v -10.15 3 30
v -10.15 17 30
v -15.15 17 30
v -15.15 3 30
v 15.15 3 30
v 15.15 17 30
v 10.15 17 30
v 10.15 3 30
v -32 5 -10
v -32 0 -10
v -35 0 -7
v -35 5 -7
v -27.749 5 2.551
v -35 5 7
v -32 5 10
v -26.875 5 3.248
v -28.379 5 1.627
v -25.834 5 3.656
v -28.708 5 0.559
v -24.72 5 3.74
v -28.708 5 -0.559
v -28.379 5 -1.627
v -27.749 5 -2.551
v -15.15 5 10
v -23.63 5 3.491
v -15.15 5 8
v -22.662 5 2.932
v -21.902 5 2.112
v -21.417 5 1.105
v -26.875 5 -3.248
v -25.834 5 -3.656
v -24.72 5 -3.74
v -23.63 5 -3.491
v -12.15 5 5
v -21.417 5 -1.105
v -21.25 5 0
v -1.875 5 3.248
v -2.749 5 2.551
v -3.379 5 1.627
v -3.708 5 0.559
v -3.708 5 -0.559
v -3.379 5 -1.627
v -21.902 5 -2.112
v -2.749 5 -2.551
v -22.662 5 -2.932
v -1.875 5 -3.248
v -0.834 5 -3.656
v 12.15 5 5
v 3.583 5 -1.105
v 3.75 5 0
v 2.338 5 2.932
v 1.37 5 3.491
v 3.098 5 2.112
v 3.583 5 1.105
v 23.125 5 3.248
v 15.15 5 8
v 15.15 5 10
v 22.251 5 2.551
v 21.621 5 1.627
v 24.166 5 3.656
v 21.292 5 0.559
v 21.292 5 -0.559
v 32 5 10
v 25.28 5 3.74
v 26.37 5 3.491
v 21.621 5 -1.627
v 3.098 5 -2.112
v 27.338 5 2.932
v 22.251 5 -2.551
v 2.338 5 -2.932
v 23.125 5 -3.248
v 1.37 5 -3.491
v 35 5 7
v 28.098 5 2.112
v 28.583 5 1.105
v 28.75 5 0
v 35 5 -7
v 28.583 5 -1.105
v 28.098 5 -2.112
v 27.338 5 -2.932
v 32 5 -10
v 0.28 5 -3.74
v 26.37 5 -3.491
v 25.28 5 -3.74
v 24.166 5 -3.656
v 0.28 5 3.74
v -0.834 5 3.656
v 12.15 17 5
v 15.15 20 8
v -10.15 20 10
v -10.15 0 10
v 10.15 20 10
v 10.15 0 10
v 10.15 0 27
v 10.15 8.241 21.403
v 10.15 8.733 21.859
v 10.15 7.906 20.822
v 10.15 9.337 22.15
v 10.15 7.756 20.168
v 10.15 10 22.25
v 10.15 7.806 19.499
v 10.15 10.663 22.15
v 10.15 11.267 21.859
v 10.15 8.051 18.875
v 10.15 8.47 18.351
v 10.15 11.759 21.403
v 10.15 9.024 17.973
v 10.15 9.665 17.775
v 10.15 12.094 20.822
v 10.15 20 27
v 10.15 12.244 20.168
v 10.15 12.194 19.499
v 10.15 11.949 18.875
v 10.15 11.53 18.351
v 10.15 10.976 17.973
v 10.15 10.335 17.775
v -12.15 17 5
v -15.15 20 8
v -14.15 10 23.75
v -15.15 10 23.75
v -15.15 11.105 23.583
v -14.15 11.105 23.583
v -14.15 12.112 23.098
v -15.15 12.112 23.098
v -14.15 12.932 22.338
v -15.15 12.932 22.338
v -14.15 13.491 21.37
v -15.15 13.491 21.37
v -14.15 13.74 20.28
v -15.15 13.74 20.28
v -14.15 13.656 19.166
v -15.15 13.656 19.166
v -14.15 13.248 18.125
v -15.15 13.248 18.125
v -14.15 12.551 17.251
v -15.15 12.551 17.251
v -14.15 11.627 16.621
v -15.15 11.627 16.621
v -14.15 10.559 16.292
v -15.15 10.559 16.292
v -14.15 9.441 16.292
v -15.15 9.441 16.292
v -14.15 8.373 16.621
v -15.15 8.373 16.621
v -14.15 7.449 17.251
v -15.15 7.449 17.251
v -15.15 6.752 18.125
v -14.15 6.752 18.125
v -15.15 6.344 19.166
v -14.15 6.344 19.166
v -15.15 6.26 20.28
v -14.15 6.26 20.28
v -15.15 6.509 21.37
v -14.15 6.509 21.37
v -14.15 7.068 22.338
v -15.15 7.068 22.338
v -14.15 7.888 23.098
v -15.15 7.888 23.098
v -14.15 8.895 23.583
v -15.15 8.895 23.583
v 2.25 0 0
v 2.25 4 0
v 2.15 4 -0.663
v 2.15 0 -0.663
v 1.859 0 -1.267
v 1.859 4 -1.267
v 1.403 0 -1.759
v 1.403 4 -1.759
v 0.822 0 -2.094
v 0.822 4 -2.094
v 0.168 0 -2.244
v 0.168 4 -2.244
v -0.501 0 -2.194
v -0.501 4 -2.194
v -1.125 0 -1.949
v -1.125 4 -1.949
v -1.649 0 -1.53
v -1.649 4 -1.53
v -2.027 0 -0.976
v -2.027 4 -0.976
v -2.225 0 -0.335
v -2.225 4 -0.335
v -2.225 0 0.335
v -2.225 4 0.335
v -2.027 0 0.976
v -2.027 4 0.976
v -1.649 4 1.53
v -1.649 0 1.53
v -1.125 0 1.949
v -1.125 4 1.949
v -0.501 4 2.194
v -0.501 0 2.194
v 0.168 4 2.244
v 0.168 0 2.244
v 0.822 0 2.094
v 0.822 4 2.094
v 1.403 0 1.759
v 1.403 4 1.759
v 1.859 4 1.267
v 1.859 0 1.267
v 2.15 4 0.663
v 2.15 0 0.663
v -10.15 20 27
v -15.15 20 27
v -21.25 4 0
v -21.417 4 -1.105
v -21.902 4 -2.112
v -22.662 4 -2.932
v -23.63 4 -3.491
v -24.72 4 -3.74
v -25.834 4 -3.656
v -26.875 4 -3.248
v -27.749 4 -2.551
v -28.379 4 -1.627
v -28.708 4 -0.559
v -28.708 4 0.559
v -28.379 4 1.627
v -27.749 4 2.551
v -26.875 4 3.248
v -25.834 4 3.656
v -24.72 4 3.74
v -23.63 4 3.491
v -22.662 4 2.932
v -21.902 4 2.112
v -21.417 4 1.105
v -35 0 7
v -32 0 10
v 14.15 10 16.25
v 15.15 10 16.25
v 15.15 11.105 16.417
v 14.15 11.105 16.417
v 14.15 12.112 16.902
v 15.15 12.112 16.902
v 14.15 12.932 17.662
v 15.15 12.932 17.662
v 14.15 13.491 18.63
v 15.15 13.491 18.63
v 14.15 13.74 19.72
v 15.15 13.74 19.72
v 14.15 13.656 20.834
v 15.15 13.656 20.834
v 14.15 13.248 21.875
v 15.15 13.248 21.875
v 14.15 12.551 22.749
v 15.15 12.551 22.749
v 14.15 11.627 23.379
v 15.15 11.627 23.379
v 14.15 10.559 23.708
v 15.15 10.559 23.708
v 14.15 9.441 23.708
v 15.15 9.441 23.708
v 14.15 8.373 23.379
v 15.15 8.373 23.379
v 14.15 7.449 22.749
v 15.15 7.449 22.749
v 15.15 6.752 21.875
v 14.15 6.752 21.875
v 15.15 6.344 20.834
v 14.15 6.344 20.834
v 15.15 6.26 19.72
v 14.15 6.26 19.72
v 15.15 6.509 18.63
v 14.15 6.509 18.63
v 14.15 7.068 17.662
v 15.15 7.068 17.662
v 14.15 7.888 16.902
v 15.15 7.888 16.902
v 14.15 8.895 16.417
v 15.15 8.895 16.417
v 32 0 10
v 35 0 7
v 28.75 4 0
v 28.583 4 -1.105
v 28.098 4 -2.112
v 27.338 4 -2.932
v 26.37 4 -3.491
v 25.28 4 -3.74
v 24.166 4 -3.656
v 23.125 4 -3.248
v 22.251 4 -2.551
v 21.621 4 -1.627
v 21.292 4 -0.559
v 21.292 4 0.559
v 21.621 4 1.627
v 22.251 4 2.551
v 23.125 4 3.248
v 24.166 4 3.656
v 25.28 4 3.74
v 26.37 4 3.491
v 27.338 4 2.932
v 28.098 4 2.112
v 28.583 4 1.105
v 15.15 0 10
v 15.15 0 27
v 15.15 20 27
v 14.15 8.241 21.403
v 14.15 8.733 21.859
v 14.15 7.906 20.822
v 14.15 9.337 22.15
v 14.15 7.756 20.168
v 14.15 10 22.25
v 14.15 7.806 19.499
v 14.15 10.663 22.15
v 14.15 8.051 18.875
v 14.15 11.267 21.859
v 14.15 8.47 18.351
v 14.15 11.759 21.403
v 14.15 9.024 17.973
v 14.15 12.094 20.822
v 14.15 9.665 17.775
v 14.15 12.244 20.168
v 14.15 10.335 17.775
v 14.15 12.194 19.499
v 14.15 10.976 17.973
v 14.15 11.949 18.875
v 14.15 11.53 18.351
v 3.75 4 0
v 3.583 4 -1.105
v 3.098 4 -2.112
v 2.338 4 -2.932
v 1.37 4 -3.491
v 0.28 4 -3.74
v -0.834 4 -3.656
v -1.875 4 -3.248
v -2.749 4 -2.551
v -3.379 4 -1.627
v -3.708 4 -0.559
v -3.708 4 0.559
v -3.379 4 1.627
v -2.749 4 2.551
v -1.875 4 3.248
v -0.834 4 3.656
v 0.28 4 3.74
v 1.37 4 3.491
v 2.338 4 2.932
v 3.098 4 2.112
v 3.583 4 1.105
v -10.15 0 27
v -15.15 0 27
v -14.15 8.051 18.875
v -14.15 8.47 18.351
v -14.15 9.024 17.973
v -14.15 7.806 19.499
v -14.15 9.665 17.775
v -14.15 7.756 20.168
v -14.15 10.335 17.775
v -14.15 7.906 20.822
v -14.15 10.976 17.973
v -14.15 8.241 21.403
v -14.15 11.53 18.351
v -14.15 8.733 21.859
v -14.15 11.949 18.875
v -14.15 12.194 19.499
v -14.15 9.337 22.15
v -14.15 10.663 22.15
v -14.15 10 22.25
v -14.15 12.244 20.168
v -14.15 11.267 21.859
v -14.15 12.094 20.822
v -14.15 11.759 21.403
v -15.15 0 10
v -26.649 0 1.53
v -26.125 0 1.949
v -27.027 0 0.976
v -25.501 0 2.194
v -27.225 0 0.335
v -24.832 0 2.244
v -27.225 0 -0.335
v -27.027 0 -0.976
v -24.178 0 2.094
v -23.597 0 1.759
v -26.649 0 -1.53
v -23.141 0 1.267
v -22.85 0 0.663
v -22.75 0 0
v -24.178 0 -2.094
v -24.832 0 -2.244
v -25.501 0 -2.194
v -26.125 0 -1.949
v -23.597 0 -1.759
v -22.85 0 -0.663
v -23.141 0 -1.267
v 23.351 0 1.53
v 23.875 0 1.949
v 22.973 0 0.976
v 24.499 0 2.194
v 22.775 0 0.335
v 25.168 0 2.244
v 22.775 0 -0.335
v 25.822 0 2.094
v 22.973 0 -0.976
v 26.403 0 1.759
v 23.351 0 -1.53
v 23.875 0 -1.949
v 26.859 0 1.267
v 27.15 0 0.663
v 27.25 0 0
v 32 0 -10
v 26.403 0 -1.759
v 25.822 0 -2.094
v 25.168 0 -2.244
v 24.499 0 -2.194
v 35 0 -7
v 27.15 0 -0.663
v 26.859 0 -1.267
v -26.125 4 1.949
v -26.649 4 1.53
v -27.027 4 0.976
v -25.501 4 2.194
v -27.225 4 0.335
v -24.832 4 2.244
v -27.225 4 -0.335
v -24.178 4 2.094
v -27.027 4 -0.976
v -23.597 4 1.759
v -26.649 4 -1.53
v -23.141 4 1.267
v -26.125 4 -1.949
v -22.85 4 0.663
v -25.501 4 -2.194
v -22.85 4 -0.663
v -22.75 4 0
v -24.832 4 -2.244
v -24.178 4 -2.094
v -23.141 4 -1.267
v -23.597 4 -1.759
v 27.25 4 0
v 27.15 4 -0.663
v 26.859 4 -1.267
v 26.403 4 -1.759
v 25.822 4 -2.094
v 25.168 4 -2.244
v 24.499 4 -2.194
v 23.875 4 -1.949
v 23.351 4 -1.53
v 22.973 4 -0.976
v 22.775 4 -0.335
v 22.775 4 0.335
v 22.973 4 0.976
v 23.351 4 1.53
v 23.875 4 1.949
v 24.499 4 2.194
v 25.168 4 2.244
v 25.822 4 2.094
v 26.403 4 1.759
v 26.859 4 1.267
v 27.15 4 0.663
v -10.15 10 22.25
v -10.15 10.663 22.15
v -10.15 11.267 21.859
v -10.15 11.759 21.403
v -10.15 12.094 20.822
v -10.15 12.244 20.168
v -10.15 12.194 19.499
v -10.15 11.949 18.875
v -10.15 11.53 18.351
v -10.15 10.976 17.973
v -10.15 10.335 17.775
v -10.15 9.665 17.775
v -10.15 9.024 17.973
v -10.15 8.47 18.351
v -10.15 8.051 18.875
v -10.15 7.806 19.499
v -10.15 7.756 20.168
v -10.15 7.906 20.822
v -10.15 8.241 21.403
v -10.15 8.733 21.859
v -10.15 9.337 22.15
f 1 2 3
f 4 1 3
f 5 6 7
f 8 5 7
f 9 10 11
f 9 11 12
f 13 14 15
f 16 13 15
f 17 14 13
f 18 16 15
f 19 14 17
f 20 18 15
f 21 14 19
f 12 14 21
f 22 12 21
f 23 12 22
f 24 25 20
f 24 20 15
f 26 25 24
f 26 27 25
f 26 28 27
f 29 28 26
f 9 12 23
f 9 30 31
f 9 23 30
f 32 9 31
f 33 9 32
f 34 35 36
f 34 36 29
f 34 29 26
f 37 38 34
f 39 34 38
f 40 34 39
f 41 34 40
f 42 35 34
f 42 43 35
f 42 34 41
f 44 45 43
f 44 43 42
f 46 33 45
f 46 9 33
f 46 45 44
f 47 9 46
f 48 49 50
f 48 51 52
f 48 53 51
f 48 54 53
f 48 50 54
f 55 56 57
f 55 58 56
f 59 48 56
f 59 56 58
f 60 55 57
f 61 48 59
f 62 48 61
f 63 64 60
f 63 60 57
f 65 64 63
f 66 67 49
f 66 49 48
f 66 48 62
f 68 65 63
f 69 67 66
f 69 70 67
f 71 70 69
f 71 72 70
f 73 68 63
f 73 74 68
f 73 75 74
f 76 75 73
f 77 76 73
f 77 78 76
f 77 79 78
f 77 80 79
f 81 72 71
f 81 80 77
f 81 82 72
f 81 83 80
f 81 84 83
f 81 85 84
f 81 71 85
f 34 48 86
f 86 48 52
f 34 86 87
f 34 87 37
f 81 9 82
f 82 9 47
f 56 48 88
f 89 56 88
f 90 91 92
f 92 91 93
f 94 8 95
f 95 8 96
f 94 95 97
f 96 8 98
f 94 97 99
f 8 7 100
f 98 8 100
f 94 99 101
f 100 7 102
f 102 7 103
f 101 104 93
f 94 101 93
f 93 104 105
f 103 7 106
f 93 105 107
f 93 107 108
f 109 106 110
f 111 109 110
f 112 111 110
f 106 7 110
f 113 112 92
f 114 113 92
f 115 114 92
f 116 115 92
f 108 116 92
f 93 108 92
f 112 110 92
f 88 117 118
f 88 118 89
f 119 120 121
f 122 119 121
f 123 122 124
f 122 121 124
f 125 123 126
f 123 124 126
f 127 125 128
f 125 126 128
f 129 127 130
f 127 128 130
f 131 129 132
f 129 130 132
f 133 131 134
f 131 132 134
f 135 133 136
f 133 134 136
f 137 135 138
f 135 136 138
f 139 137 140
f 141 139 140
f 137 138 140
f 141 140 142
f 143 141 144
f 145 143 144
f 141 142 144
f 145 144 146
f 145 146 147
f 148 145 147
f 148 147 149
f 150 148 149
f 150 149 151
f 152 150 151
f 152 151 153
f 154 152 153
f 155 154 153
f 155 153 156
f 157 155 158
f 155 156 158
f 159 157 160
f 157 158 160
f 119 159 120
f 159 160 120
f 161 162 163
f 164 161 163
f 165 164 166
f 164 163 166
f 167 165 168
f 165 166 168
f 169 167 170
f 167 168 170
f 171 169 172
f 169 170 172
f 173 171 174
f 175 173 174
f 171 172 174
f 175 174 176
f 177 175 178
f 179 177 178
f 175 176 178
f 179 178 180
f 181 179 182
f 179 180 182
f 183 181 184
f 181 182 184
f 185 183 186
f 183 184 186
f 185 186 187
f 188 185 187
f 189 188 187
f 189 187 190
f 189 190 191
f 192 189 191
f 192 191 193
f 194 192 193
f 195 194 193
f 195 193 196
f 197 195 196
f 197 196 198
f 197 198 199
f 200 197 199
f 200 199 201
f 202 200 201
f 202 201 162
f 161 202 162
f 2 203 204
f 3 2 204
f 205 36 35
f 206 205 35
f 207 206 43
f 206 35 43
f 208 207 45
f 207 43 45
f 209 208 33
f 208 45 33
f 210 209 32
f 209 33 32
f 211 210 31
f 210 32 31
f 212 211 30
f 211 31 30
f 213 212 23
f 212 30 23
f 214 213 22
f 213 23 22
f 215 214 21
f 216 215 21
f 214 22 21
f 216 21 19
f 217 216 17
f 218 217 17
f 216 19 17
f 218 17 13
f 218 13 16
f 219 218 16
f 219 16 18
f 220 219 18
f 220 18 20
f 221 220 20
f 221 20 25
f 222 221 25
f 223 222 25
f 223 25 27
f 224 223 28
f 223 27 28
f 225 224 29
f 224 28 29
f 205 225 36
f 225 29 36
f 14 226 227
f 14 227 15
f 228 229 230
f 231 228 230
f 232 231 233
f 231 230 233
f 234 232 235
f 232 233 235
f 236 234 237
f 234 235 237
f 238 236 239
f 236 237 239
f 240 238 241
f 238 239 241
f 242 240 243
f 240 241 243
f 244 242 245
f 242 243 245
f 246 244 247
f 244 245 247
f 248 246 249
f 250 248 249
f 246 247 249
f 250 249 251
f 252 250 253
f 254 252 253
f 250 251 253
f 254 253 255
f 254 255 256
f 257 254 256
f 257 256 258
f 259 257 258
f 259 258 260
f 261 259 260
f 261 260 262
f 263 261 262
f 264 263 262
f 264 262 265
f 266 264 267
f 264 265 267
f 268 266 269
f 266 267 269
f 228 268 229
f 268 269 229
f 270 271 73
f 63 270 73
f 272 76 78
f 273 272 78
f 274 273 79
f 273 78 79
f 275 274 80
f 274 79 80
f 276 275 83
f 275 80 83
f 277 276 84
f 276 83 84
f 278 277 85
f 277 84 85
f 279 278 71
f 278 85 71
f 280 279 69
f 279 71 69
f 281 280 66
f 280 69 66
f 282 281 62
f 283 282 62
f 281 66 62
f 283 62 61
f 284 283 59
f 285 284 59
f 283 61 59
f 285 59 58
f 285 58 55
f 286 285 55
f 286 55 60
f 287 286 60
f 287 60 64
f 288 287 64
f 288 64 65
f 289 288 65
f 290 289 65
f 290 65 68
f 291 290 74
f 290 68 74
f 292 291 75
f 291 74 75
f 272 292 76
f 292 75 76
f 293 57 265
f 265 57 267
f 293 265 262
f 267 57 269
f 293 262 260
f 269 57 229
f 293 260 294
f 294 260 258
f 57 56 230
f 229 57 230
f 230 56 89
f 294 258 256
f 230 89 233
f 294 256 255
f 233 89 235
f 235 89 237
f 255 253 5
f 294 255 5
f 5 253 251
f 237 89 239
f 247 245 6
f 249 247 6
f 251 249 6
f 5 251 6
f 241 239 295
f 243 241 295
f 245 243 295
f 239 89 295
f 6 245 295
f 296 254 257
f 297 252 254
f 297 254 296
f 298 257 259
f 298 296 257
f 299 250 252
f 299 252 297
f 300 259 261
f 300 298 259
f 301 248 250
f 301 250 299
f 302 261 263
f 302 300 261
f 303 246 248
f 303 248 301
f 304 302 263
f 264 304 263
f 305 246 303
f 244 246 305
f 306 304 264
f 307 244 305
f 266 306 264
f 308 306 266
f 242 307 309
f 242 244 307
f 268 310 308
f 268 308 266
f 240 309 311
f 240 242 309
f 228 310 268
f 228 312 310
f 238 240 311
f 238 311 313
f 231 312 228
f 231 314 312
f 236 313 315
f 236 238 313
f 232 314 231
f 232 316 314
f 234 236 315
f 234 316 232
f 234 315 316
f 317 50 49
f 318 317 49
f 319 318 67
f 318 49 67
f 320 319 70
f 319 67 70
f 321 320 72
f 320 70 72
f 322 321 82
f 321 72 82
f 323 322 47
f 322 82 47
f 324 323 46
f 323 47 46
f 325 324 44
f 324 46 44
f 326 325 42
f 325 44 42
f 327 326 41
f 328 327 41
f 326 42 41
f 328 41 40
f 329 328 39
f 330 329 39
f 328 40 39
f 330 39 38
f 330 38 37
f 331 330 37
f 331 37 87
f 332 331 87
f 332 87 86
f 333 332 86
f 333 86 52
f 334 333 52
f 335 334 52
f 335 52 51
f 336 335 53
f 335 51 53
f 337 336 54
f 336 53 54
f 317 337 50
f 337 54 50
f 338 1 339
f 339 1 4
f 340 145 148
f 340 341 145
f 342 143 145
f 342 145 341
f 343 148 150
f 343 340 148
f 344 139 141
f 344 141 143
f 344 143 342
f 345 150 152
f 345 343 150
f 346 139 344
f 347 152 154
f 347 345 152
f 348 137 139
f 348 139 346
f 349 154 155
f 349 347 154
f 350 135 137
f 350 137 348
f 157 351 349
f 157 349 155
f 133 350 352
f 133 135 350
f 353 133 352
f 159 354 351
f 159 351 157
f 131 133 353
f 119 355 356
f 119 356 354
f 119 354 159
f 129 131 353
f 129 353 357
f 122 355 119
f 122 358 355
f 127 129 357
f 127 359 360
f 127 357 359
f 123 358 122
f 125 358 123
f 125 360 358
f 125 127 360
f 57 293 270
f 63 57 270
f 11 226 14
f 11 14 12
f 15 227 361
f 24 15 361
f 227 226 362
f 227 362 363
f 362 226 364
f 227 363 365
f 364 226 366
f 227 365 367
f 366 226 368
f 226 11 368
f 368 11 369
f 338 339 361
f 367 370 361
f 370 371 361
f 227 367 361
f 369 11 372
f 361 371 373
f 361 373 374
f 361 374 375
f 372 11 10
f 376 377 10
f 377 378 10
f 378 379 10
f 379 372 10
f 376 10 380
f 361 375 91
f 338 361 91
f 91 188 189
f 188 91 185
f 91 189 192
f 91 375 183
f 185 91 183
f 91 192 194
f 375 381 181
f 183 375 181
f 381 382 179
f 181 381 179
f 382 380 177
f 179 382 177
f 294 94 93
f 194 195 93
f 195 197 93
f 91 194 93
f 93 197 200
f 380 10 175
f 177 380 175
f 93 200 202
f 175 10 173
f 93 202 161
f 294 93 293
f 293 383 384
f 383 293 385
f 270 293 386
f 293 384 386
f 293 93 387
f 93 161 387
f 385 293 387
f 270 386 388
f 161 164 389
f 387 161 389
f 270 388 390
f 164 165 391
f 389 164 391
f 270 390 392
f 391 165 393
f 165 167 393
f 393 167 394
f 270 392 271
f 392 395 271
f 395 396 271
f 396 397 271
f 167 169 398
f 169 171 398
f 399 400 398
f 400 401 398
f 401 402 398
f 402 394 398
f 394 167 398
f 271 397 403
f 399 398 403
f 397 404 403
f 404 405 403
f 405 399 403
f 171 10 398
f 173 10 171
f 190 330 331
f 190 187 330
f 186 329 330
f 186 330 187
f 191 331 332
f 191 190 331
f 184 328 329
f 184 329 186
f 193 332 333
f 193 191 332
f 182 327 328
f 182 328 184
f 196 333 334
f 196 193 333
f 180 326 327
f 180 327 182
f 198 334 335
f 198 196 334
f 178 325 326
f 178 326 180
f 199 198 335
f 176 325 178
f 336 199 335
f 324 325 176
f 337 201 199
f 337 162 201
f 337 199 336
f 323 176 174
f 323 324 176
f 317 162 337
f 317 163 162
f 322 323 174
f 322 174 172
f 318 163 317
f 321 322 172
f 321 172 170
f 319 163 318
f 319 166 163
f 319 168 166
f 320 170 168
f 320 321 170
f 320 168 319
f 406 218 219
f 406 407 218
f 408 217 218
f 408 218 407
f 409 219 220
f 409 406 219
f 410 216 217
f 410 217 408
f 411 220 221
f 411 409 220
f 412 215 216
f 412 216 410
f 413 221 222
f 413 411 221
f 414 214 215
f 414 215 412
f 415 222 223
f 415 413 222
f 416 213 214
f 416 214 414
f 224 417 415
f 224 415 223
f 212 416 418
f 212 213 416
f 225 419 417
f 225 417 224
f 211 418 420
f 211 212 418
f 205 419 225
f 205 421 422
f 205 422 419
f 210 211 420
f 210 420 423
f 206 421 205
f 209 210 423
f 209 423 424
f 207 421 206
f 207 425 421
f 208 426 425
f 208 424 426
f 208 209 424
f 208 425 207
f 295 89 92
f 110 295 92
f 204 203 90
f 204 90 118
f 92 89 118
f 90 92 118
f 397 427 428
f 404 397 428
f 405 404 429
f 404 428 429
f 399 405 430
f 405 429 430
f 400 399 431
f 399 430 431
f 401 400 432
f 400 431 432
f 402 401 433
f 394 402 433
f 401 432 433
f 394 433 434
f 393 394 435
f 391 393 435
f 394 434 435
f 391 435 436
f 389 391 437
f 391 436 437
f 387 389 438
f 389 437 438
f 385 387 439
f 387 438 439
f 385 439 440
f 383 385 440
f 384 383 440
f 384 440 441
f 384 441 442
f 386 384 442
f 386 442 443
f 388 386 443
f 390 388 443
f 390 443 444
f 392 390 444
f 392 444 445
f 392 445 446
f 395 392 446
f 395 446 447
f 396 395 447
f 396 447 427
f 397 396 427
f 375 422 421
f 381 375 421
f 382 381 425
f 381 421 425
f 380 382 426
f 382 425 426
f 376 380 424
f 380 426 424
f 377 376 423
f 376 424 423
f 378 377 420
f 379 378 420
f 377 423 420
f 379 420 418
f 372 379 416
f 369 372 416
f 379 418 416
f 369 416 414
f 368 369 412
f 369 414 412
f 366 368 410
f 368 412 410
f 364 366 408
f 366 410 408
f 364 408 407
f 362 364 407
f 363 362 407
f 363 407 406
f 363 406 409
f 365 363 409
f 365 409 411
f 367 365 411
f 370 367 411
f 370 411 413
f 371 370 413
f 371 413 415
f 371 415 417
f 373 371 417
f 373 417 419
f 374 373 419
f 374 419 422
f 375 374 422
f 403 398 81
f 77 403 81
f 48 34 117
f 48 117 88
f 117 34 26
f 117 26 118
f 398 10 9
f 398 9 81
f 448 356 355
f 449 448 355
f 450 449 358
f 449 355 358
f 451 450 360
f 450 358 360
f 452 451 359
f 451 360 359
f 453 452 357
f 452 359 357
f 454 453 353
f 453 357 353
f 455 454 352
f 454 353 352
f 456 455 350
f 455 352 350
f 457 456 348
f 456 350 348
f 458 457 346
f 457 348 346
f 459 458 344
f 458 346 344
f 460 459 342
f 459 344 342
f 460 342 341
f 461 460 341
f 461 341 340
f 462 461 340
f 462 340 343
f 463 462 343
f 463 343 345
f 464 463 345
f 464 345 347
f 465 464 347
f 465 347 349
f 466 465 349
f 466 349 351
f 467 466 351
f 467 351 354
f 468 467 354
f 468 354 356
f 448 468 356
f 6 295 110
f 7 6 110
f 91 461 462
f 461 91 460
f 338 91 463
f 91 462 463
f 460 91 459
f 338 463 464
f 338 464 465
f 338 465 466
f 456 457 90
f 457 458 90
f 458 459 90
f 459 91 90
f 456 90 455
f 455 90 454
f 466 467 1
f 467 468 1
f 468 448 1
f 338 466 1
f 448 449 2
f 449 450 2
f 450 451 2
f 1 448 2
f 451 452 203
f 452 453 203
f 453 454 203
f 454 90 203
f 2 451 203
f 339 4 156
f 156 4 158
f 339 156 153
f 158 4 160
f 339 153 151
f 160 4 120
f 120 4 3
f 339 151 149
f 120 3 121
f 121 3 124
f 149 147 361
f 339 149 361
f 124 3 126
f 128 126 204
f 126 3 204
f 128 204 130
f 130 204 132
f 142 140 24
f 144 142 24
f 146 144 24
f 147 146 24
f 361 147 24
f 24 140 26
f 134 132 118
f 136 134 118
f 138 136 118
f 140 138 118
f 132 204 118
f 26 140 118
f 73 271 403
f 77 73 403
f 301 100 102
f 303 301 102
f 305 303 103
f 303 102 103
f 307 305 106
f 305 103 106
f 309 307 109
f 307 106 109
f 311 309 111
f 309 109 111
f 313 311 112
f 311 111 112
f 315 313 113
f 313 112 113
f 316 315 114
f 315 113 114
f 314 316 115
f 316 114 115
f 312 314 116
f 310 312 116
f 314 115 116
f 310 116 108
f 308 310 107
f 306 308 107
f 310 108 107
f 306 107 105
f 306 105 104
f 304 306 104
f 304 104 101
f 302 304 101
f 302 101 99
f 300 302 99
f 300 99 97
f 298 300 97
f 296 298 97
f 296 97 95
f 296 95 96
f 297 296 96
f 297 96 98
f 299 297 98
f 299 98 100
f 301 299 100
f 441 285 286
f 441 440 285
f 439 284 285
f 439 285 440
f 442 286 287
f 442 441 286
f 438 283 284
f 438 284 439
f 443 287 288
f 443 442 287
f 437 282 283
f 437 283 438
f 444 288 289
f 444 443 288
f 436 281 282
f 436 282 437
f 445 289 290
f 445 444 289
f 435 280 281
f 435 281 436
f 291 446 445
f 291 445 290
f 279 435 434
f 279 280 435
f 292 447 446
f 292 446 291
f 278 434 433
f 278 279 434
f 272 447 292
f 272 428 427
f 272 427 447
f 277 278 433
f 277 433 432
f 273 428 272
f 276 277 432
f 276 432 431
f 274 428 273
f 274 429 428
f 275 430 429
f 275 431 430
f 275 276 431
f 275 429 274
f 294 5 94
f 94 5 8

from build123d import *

# Parameters (mm, degrees)
SKETCH3_W                = 70
SKETCH3_H                = 20
BOSS_EXTRUDE2_DEPTH      = 5
BOSS_EXTRUDE3_DEPTH      = 15
BOSS_EXTRUDE3_DEPTH_BACK = 5
CUT_EXTRUDE1_REACH       = 7
SKETCH5_R                = 2.25
SKETCH6_R                = 3.75
CUT_EXTRUDE2_DEPTH       = 16
CUT_EXTRUDE2_DEPTH_BACK  = 1
SKETCH7_R                = 2.25
CUT_EXTRUDE3_DEPTH       = 20.85
CUT_EXTRUDE3_DEPTH_BACK  = 51.15
SKETCH11_R               = 3.75
CUT_EXTRUDE4_DEPTH       = 1
SKETCH12_R               = 3.75
CUT_EXTRUDE5_DEPTH       = 1
CHAMFER1_SIZE            = 3


with BuildPart() as part:
    # Sketch3 → Boss-Extrude2 (new body)
    with BuildSketch(Plane(origin=(0, 0, 0), x_dir=(1, 0, 0), z_dir=(0, 1, 0))):
        Rectangle(SKETCH3_W, SKETCH3_H)
    extrude(amount=BOSS_EXTRUDE2_DEPTH)

    # Sketch4 → Boss-Extrude3 (add, two sides)
    with BuildSketch(Plane(origin=(0, 5, 0), x_dir=(1, 0, 0), z_dir=(0, 1, 0))) as boss_extrude3_sk:
        Polygon((-15.15, -5), (15.15, -5), (15.15, -30), (10.15, -30), (10.15, -10), (-10.15, -10), (-10.15, -30), (-15.15, -30), align=None)
    extrude(amount=BOSS_EXTRUDE3_DEPTH)
    extrude(boss_extrude3_sk.sketch, amount=-BOSS_EXTRUDE3_DEPTH_BACK)

    # Sketch5 → Cut-Extrude1 (cut, up to next)
    with BuildSketch(Plane(origin=(0, 5, 0), x_dir=(1, 0, 0), z_dir=(0, 1, 0)), mode=Mode.PRIVATE) as cut_extrude1_sk1:
        Circle(SKETCH5_R)
    cut_extrude1_tool1 = extrude(cut_extrude1_sk1.sketch, amount=-CUT_EXTRUDE1_REACH, mode=Mode.PRIVATE) & part.part
    add(cut_extrude1_tool1.solids().sort_by_distance((0, 5, 0))[0], mode=Mode.SUBTRACT)
    # Sketch5 → Cut-Extrude1 (cut, up to next)
    with BuildSketch(Plane(origin=(0, 5, 0), x_dir=(1, 0, 0), z_dir=(0, 1, 0)), mode=Mode.PRIVATE) as cut_extrude1_sk2:
        with Locations((25, 0)):
            Circle(SKETCH5_R)
    cut_extrude1_tool2 = extrude(cut_extrude1_sk2.sketch, amount=-CUT_EXTRUDE1_REACH, mode=Mode.PRIVATE) & part.part
    add(cut_extrude1_tool2.solids().sort_by_distance((25, 5, 0))[0], mode=Mode.SUBTRACT)
    # Sketch5 → Cut-Extrude1 (cut, up to next)
    with BuildSketch(Plane(origin=(0, 5, 0), x_dir=(1, 0, 0), z_dir=(0, 1, 0)), mode=Mode.PRIVATE) as cut_extrude1_sk3:
        with Locations((-25, 0)):
            Circle(SKETCH5_R)
    cut_extrude1_tool3 = extrude(cut_extrude1_sk3.sketch, amount=-CUT_EXTRUDE1_REACH, mode=Mode.PRIVATE) & part.part
    add(cut_extrude1_tool3.solids().sort_by_distance((-25, 5, 0))[0], mode=Mode.SUBTRACT)

    # Sketch6 → Cut-Extrude2 (cut, two sides)
    with BuildSketch(Plane(origin=(0, 5, 0), x_dir=(1, 0, 0), z_dir=(0, 1, 0))) as cut_extrude2_sk:
        with Locations((-25, 0)):
            Circle(SKETCH6_R)
        Circle(SKETCH6_R)
        with Locations((25, 0)):
            Circle(SKETCH6_R)
    extrude(amount=CUT_EXTRUDE2_DEPTH, mode=Mode.SUBTRACT)
    extrude(cut_extrude2_sk.sketch, amount=-CUT_EXTRUDE2_DEPTH_BACK, mode=Mode.SUBTRACT)

    # Sketch7 → Cut-Extrude3 (cut, two sides)
    with BuildSketch(Plane.ZY.offset(15.15)) as cut_extrude3_sk:
        with Locations((20, 10)):
            Circle(SKETCH7_R)
    extrude(amount=CUT_EXTRUDE3_DEPTH, mode=Mode.SUBTRACT)
    extrude(cut_extrude3_sk.sketch, amount=-CUT_EXTRUDE3_DEPTH_BACK, mode=Mode.SUBTRACT)

    # Sketch11 → Cut-Extrude4 (cut)
    with BuildSketch(Plane.ZY.offset(15.15)):
        with Locations((20, 10)):
            Circle(SKETCH11_R)
    extrude(amount=-CUT_EXTRUDE4_DEPTH, mode=Mode.SUBTRACT)

    # Sketch12 → Cut-Extrude5 (cut)
    with BuildSketch(Plane(origin=(15.15, 0, 0), x_dir=(0, 0, -1), z_dir=(1, 0, 0))):
        with Locations((-20, 10)):
            Circle(SKETCH12_R)
    extrude(amount=-CUT_EXTRUDE5_DEPTH, mode=Mode.SUBTRACT)

    # Chamfer1
    chamfer1_edges = [part.edges().sort_by_distance(p)[0] for p in [
        (15.15, 12.5, 5),
        (-15.15, 12.5, 5),
        (-12.65, 0, 30),
        (12.65, 0, 30),
        (0, 20, 5),
        (-12.65, 20, 30),
        (12.65, 20, 30),
        (35, 2.5, 10),
        (-35, 2.5, 10),
        (-35, 2.5, -10),
        (35, 2.5, -10),
    ]]
    chamfer(chamfer1_edges, length=CHAMFER1_SIZE)


solid = part.part
